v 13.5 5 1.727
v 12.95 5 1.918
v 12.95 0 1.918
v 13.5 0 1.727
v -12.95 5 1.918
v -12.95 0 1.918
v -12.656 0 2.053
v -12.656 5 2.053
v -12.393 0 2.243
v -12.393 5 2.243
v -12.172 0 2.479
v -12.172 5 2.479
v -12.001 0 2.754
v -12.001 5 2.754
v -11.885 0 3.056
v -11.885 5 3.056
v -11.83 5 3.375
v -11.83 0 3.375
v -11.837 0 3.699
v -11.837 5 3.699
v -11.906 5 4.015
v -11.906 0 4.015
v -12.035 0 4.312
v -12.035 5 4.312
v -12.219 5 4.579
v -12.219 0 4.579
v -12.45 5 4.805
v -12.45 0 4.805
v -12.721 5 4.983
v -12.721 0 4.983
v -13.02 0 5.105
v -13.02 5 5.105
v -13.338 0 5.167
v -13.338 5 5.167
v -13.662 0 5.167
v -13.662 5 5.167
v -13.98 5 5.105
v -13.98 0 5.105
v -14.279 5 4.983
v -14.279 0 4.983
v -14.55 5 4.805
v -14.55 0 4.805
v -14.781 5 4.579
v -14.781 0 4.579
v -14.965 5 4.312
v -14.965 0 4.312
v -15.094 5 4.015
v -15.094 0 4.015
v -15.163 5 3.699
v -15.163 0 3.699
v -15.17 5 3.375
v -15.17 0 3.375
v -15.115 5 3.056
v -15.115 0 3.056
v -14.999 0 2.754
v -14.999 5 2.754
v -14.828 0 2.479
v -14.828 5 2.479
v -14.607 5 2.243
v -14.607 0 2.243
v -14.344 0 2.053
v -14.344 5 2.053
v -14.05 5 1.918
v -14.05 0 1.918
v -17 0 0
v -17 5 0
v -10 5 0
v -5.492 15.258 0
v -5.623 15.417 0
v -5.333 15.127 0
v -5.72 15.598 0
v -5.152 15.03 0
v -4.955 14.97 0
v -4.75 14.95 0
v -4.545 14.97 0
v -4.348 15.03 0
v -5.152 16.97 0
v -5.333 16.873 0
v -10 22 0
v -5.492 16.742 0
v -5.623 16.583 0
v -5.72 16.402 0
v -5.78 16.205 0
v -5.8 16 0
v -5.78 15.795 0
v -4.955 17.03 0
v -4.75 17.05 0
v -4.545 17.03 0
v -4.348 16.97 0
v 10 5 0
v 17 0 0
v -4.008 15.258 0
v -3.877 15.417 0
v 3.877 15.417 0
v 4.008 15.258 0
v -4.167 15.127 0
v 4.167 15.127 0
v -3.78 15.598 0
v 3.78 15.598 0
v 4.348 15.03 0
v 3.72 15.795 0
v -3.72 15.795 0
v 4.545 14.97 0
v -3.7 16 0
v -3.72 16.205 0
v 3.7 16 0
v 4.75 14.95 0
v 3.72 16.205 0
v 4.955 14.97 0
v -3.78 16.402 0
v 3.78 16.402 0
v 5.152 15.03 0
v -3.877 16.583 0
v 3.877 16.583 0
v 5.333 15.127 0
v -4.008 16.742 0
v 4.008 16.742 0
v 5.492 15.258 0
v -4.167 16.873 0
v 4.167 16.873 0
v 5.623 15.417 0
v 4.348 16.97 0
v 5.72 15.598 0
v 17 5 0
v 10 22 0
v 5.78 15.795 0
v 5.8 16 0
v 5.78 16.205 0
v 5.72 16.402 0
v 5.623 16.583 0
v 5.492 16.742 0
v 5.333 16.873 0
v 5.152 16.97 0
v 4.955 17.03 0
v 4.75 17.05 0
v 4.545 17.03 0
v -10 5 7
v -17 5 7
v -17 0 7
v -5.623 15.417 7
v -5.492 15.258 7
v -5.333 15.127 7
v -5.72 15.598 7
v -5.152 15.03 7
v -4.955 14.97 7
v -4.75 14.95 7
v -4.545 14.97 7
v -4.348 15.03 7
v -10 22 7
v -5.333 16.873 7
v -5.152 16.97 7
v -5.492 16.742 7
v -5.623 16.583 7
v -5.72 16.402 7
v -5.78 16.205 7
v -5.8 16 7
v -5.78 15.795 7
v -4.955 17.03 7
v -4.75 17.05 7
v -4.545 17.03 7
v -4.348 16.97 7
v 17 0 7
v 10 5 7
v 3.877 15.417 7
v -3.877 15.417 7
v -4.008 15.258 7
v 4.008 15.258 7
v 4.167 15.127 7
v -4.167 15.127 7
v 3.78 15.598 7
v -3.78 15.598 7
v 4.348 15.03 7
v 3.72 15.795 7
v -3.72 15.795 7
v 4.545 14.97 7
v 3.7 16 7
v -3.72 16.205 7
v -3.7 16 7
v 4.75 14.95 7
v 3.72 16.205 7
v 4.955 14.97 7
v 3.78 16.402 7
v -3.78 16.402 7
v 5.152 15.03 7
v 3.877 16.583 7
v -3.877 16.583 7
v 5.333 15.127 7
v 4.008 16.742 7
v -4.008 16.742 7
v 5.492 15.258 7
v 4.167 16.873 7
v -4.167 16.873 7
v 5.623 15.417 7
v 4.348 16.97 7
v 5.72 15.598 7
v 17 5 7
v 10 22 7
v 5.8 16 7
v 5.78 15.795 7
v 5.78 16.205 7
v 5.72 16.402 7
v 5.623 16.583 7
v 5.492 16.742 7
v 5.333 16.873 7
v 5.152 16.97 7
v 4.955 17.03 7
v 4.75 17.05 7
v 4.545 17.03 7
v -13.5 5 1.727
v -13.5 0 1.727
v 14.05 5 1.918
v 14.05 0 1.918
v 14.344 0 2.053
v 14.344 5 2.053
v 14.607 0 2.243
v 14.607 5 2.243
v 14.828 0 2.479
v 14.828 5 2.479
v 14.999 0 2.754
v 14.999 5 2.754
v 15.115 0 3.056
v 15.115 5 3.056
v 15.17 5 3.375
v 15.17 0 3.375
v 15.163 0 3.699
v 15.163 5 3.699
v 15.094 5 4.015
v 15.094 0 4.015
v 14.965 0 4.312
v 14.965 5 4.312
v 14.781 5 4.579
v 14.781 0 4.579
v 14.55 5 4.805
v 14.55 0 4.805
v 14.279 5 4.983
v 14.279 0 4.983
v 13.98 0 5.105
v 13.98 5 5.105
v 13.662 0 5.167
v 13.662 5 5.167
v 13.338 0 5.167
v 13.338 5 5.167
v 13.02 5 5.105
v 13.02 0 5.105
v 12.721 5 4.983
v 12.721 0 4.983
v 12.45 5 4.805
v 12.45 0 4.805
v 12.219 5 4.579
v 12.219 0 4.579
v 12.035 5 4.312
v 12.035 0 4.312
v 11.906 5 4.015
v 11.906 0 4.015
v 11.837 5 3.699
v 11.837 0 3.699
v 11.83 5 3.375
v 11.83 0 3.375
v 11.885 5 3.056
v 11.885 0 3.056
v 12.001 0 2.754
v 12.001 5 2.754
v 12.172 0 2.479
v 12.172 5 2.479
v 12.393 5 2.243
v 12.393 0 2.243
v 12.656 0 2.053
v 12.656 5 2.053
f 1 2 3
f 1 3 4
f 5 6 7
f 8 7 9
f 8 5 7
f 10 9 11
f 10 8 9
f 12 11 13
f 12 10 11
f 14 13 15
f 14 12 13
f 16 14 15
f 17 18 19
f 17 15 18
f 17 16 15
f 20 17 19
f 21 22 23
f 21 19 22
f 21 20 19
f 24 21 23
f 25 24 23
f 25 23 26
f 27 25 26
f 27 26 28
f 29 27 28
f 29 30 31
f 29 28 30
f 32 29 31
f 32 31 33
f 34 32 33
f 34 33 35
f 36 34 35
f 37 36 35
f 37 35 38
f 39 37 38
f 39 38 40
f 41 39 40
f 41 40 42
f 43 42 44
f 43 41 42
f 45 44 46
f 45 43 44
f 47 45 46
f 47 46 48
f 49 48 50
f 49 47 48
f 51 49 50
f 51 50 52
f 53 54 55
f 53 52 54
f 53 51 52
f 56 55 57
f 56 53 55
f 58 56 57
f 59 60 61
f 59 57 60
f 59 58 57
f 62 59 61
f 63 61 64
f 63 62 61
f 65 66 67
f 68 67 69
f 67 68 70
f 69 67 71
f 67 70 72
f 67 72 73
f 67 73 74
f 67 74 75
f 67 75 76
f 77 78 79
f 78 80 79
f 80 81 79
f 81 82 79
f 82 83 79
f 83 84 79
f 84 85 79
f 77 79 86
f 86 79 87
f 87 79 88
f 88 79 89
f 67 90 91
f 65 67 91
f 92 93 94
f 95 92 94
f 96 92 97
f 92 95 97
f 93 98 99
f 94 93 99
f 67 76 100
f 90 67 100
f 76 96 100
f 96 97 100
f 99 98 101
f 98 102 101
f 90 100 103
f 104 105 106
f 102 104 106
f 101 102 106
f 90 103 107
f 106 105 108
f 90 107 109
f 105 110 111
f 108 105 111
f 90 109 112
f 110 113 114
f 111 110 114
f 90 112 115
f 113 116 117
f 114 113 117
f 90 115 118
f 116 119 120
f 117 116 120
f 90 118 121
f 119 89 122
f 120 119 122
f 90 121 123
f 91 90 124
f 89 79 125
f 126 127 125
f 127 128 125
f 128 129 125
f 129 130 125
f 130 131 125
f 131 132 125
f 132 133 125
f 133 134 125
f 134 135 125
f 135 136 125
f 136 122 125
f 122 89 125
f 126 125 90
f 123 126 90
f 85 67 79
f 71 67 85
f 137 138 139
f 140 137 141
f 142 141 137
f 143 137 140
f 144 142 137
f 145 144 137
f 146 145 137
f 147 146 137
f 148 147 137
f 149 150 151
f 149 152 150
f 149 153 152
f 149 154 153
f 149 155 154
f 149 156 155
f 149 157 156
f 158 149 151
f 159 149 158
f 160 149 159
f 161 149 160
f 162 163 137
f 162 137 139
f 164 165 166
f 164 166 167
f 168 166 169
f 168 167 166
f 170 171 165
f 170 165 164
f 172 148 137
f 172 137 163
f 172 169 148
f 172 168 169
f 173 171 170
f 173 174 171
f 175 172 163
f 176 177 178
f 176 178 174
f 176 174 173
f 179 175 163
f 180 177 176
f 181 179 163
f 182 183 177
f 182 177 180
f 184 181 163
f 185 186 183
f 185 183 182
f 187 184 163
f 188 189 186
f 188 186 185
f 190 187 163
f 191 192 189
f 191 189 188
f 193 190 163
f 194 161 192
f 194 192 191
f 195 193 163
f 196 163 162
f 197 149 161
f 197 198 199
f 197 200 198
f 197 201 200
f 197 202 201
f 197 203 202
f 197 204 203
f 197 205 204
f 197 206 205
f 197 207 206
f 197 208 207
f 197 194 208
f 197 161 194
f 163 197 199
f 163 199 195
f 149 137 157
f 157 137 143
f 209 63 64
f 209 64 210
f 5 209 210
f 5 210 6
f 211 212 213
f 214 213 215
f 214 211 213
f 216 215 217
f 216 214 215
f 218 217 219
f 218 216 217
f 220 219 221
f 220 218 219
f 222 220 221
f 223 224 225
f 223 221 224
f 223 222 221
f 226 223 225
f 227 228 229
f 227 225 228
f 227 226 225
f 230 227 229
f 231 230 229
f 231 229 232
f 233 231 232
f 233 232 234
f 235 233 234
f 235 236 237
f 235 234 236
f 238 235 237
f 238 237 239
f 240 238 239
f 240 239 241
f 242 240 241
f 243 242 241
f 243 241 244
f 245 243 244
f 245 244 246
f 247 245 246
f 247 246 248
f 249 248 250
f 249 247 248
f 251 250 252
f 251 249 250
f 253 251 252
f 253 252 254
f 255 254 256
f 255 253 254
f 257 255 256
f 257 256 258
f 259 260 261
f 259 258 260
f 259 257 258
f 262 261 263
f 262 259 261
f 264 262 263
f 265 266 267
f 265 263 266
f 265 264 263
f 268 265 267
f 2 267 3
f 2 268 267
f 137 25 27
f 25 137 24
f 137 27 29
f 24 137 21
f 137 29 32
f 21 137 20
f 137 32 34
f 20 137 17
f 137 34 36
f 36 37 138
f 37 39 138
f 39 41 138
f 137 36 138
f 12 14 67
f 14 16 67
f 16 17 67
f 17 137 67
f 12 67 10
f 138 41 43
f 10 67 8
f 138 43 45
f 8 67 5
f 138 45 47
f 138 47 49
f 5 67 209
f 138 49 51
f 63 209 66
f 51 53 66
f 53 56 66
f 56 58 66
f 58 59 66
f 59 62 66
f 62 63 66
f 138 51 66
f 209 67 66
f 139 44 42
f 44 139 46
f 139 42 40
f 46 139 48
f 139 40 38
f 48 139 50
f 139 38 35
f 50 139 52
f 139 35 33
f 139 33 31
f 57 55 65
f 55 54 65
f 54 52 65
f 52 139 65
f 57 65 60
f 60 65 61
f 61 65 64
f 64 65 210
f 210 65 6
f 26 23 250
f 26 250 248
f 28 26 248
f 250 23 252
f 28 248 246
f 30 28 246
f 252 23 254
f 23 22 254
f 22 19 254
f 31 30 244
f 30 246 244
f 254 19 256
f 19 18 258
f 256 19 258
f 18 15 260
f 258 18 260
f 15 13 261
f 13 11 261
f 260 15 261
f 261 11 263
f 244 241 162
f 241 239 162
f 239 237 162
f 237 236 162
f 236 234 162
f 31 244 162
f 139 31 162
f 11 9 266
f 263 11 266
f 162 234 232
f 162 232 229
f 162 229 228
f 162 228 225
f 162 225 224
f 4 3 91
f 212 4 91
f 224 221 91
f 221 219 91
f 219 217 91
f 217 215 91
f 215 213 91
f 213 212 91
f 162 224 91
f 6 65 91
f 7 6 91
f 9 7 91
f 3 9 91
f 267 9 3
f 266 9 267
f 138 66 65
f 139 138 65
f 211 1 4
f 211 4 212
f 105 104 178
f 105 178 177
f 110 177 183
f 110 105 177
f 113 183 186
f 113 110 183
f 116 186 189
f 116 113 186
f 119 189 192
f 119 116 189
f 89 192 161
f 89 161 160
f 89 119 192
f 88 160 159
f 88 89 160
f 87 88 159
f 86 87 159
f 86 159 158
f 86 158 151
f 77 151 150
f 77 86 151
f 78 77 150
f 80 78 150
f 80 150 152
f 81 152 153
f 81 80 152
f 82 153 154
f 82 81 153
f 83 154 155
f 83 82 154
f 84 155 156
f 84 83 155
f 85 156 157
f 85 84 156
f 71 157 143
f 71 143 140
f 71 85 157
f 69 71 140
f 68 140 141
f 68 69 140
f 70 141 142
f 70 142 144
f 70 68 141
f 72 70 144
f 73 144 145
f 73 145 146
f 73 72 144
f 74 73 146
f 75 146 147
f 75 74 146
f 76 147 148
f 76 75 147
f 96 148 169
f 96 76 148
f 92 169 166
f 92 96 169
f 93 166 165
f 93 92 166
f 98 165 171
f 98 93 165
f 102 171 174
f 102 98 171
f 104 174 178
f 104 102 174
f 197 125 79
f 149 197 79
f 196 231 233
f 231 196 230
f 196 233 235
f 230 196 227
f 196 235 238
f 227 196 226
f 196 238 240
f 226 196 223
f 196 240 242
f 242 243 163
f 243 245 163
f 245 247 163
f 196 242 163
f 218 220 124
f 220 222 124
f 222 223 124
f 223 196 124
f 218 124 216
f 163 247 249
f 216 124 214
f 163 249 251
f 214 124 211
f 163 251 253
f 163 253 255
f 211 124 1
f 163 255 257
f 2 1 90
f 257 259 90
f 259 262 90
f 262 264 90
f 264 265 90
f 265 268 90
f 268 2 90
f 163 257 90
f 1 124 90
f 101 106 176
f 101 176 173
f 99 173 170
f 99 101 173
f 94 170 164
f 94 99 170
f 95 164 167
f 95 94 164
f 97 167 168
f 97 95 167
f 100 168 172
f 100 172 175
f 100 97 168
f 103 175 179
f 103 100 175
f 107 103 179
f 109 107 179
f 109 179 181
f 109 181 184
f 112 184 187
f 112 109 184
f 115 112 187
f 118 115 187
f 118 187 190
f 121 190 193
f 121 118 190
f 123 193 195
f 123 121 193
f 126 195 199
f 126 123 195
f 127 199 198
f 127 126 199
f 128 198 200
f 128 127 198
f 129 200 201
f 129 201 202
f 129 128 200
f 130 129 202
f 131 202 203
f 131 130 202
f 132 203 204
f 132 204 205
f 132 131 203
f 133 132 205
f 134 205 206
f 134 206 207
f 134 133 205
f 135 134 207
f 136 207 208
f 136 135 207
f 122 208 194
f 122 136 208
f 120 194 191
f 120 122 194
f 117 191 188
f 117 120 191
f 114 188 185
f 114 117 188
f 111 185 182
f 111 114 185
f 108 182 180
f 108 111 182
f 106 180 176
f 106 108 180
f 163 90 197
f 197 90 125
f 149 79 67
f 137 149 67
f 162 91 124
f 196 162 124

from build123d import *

# Parameters (mm, degrees)
SKETCH2_R           = 1.05
BOSS_EXTRUDE1_DEPTH = 7
CUT_EXTRUDE1_DEPTH  = 26.039968051


with BuildPart() as part:
    # Sketch2 → Boss-Extrude1 (new body)
    with BuildSketch(Plane.XY):
        Polygon((-10, 5), (-17, 5), (-17, 0), (17, 0), (17, 5), (10, 5), (10, 22), (-10, 22), align=None)
        with Locations((-4.75, 16)):
            Circle(SKETCH2_R, mode=Mode.SUBTRACT)
        with Locations(Location((4.75, 16, 0), (0, 0, 180))):
            Circle(SKETCH2_R, mode=Mode.SUBTRACT)
    extrude(amount=BOSS_EXTRUDE1_DEPTH)

    # Sketch3 → Cut-Extrude1 (cut, through all)
    with BuildSketch(Plane(origin=(0, 5, 0), x_dir=(1, 0, 0), z_dir=(0, 1, 0))):
        with BuildLine():
            Line((-13.5, -1.72667493), (-12.95, -1.917873267))
            ThreePointArc((-12.95, -1.917873267), (-13.5, -5.175), (-14.05, -1.917873267))
            Line((-14.05, -1.917873267), (-13.5, -1.72667493))
        make_face()
        with BuildLine():
            Line((13.5, -1.72667493), (14.05, -1.917873267))
            ThreePointArc((14.05, -1.917873267), (13.5, -5.175), (12.95, -1.917873267))
            Line((12.95, -1.917873267), (13.5, -1.72667493))
        make_face()
    extrude(amount=-CUT_EXTRUDE1_DEPTH, mode=Mode.SUBTRACT)


solid = part.part
